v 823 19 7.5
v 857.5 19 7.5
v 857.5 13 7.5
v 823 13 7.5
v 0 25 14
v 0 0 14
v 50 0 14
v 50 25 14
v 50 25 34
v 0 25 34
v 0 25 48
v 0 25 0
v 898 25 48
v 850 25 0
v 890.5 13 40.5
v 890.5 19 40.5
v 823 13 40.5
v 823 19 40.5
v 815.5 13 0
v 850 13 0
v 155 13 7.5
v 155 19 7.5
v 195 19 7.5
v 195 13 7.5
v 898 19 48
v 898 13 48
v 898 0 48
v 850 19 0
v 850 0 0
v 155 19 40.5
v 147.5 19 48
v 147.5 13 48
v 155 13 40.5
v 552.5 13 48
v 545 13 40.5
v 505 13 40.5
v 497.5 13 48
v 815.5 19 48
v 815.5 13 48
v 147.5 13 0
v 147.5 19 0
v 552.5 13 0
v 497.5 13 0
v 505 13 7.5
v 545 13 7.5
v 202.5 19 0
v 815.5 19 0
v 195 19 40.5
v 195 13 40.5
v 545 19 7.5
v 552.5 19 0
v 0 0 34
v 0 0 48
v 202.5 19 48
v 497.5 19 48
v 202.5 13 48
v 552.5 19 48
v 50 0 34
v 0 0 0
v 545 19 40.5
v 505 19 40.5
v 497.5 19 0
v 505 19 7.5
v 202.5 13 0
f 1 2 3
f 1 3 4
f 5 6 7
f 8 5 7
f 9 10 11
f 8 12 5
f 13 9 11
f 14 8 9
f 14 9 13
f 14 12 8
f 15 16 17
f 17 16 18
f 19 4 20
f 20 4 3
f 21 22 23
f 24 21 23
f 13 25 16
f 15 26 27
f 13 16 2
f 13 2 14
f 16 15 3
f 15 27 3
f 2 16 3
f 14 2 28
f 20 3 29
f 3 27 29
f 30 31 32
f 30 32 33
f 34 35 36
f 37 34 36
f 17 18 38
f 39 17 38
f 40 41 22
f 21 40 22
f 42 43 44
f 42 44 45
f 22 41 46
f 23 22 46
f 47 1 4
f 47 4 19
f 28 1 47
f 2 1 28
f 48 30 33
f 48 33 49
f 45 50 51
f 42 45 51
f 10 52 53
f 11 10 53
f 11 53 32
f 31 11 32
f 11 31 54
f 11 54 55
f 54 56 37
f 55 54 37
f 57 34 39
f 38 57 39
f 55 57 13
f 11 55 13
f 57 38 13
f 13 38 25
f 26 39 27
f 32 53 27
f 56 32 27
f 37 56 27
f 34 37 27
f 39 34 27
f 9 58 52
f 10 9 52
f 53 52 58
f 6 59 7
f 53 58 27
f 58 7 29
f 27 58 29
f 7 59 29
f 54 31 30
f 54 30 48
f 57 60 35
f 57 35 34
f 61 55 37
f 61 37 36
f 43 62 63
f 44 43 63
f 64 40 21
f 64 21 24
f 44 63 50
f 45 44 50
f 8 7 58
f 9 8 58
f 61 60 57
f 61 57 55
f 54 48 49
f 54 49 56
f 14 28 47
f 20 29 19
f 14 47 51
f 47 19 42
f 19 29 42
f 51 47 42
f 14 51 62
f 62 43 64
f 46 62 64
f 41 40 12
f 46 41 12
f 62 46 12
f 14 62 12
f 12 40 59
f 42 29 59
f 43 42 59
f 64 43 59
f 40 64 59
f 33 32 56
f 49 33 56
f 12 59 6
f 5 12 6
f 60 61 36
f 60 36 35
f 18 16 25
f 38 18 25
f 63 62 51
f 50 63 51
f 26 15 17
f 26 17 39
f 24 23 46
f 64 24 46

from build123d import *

# Parameters (mm, degrees)
EXTRUDE_1_DEPTH        = 25
CUT_EXTRUDE_START      = -6
CUT_EXTRUDE_2_DEPTH    = 6
PATTERN_LINEAR_1_COUNT = 2
PATTERN_LINEAR_1_PITCH = 350
MIRROR_START           = -6
MIRROR_1_COPY_1_DEPTH  = 6
CUT_EXTRUDE_3_DEPTH    = 6


with BuildPart() as part:
    # 草图1 → 凸台-拉伸1 (new body)
    with BuildSketch(Plane(origin=(0, 0, 0), x_dir=(1, 0, 0), z_dir=(0, 1, 0))):
        Polygon((0, 0), (0, -14), (50, -14), (50, -34), (0, -34), (0, -48), (898, -48), (850, 0), align=None)
    extrude(amount=EXTRUDE_1_DEPTH)

    # 草图5 → 切除-拉伸2 (cut)
    with BuildSketch(Plane(origin=(0, 25, 0), x_dir=(1, 0, 0), z_dir=(0, 1, 0)).offset(CUT_EXTRUDE_START)):
        Polygon((147.5, 0), (155, -7.5), (195, -7.5), (202.5, 0), align=None)
    cut_extrude_2 = extrude(amount=-CUT_EXTRUDE_2_DEPTH, mode=Mode.SUBTRACT)

    # 阵列(线性)1: 切除-拉伸2 ×2
    with Locations(*[(i * PATTERN_LINEAR_1_PITCH, 0, 0) for i in range(1, PATTERN_LINEAR_1_COUNT)]):
        add(cut_extrude_2, mode=Mode.SUBTRACT)

    # 镜向1: 切除-拉伸2 across plane
    add(cut_extrude_2.mirror(Plane.XY.offset(24)), mode=Mode.SUBTRACT)

    # 镜向1 copy 1 sketch → 镜向1 copy 1 (cut)
    with BuildSketch(Plane(origin=(350, 25, 48), x_dir=(1, 0, 0), z_dir=(0, 1, 0)).offset(MIRROR_START)):
        Polygon((147.5, 0), (155, 7.5), (195, 7.5), (202.5, 0), align=None)
    extrude(amount=-MIRROR_1_COPY_1_DEPTH, mode=Mode.SUBTRACT)

    # 草图6 → 切除-拉伸3 (cut)
    with BuildSketch(Plane(origin=(0, 25, 0), x_dir=(1, 0, 0), z_dir=(0, 1, 0)).offset(CUT_EXTRUDE_START)):
        Polygon((890.5, -40.5), (823, -40.5), (815.5, -48), (898, -48), align=None)
    cut_extrude_3 = extrude(amount=-CUT_EXTRUDE_3_DEPTH, mode=Mode.SUBTRACT)

    # 镜向2: 切除-拉伸3 across plane
    add(cut_extrude_3.mirror(Plane.XY.offset(24)), mode=Mode.SUBTRACT)


solid = part.part
